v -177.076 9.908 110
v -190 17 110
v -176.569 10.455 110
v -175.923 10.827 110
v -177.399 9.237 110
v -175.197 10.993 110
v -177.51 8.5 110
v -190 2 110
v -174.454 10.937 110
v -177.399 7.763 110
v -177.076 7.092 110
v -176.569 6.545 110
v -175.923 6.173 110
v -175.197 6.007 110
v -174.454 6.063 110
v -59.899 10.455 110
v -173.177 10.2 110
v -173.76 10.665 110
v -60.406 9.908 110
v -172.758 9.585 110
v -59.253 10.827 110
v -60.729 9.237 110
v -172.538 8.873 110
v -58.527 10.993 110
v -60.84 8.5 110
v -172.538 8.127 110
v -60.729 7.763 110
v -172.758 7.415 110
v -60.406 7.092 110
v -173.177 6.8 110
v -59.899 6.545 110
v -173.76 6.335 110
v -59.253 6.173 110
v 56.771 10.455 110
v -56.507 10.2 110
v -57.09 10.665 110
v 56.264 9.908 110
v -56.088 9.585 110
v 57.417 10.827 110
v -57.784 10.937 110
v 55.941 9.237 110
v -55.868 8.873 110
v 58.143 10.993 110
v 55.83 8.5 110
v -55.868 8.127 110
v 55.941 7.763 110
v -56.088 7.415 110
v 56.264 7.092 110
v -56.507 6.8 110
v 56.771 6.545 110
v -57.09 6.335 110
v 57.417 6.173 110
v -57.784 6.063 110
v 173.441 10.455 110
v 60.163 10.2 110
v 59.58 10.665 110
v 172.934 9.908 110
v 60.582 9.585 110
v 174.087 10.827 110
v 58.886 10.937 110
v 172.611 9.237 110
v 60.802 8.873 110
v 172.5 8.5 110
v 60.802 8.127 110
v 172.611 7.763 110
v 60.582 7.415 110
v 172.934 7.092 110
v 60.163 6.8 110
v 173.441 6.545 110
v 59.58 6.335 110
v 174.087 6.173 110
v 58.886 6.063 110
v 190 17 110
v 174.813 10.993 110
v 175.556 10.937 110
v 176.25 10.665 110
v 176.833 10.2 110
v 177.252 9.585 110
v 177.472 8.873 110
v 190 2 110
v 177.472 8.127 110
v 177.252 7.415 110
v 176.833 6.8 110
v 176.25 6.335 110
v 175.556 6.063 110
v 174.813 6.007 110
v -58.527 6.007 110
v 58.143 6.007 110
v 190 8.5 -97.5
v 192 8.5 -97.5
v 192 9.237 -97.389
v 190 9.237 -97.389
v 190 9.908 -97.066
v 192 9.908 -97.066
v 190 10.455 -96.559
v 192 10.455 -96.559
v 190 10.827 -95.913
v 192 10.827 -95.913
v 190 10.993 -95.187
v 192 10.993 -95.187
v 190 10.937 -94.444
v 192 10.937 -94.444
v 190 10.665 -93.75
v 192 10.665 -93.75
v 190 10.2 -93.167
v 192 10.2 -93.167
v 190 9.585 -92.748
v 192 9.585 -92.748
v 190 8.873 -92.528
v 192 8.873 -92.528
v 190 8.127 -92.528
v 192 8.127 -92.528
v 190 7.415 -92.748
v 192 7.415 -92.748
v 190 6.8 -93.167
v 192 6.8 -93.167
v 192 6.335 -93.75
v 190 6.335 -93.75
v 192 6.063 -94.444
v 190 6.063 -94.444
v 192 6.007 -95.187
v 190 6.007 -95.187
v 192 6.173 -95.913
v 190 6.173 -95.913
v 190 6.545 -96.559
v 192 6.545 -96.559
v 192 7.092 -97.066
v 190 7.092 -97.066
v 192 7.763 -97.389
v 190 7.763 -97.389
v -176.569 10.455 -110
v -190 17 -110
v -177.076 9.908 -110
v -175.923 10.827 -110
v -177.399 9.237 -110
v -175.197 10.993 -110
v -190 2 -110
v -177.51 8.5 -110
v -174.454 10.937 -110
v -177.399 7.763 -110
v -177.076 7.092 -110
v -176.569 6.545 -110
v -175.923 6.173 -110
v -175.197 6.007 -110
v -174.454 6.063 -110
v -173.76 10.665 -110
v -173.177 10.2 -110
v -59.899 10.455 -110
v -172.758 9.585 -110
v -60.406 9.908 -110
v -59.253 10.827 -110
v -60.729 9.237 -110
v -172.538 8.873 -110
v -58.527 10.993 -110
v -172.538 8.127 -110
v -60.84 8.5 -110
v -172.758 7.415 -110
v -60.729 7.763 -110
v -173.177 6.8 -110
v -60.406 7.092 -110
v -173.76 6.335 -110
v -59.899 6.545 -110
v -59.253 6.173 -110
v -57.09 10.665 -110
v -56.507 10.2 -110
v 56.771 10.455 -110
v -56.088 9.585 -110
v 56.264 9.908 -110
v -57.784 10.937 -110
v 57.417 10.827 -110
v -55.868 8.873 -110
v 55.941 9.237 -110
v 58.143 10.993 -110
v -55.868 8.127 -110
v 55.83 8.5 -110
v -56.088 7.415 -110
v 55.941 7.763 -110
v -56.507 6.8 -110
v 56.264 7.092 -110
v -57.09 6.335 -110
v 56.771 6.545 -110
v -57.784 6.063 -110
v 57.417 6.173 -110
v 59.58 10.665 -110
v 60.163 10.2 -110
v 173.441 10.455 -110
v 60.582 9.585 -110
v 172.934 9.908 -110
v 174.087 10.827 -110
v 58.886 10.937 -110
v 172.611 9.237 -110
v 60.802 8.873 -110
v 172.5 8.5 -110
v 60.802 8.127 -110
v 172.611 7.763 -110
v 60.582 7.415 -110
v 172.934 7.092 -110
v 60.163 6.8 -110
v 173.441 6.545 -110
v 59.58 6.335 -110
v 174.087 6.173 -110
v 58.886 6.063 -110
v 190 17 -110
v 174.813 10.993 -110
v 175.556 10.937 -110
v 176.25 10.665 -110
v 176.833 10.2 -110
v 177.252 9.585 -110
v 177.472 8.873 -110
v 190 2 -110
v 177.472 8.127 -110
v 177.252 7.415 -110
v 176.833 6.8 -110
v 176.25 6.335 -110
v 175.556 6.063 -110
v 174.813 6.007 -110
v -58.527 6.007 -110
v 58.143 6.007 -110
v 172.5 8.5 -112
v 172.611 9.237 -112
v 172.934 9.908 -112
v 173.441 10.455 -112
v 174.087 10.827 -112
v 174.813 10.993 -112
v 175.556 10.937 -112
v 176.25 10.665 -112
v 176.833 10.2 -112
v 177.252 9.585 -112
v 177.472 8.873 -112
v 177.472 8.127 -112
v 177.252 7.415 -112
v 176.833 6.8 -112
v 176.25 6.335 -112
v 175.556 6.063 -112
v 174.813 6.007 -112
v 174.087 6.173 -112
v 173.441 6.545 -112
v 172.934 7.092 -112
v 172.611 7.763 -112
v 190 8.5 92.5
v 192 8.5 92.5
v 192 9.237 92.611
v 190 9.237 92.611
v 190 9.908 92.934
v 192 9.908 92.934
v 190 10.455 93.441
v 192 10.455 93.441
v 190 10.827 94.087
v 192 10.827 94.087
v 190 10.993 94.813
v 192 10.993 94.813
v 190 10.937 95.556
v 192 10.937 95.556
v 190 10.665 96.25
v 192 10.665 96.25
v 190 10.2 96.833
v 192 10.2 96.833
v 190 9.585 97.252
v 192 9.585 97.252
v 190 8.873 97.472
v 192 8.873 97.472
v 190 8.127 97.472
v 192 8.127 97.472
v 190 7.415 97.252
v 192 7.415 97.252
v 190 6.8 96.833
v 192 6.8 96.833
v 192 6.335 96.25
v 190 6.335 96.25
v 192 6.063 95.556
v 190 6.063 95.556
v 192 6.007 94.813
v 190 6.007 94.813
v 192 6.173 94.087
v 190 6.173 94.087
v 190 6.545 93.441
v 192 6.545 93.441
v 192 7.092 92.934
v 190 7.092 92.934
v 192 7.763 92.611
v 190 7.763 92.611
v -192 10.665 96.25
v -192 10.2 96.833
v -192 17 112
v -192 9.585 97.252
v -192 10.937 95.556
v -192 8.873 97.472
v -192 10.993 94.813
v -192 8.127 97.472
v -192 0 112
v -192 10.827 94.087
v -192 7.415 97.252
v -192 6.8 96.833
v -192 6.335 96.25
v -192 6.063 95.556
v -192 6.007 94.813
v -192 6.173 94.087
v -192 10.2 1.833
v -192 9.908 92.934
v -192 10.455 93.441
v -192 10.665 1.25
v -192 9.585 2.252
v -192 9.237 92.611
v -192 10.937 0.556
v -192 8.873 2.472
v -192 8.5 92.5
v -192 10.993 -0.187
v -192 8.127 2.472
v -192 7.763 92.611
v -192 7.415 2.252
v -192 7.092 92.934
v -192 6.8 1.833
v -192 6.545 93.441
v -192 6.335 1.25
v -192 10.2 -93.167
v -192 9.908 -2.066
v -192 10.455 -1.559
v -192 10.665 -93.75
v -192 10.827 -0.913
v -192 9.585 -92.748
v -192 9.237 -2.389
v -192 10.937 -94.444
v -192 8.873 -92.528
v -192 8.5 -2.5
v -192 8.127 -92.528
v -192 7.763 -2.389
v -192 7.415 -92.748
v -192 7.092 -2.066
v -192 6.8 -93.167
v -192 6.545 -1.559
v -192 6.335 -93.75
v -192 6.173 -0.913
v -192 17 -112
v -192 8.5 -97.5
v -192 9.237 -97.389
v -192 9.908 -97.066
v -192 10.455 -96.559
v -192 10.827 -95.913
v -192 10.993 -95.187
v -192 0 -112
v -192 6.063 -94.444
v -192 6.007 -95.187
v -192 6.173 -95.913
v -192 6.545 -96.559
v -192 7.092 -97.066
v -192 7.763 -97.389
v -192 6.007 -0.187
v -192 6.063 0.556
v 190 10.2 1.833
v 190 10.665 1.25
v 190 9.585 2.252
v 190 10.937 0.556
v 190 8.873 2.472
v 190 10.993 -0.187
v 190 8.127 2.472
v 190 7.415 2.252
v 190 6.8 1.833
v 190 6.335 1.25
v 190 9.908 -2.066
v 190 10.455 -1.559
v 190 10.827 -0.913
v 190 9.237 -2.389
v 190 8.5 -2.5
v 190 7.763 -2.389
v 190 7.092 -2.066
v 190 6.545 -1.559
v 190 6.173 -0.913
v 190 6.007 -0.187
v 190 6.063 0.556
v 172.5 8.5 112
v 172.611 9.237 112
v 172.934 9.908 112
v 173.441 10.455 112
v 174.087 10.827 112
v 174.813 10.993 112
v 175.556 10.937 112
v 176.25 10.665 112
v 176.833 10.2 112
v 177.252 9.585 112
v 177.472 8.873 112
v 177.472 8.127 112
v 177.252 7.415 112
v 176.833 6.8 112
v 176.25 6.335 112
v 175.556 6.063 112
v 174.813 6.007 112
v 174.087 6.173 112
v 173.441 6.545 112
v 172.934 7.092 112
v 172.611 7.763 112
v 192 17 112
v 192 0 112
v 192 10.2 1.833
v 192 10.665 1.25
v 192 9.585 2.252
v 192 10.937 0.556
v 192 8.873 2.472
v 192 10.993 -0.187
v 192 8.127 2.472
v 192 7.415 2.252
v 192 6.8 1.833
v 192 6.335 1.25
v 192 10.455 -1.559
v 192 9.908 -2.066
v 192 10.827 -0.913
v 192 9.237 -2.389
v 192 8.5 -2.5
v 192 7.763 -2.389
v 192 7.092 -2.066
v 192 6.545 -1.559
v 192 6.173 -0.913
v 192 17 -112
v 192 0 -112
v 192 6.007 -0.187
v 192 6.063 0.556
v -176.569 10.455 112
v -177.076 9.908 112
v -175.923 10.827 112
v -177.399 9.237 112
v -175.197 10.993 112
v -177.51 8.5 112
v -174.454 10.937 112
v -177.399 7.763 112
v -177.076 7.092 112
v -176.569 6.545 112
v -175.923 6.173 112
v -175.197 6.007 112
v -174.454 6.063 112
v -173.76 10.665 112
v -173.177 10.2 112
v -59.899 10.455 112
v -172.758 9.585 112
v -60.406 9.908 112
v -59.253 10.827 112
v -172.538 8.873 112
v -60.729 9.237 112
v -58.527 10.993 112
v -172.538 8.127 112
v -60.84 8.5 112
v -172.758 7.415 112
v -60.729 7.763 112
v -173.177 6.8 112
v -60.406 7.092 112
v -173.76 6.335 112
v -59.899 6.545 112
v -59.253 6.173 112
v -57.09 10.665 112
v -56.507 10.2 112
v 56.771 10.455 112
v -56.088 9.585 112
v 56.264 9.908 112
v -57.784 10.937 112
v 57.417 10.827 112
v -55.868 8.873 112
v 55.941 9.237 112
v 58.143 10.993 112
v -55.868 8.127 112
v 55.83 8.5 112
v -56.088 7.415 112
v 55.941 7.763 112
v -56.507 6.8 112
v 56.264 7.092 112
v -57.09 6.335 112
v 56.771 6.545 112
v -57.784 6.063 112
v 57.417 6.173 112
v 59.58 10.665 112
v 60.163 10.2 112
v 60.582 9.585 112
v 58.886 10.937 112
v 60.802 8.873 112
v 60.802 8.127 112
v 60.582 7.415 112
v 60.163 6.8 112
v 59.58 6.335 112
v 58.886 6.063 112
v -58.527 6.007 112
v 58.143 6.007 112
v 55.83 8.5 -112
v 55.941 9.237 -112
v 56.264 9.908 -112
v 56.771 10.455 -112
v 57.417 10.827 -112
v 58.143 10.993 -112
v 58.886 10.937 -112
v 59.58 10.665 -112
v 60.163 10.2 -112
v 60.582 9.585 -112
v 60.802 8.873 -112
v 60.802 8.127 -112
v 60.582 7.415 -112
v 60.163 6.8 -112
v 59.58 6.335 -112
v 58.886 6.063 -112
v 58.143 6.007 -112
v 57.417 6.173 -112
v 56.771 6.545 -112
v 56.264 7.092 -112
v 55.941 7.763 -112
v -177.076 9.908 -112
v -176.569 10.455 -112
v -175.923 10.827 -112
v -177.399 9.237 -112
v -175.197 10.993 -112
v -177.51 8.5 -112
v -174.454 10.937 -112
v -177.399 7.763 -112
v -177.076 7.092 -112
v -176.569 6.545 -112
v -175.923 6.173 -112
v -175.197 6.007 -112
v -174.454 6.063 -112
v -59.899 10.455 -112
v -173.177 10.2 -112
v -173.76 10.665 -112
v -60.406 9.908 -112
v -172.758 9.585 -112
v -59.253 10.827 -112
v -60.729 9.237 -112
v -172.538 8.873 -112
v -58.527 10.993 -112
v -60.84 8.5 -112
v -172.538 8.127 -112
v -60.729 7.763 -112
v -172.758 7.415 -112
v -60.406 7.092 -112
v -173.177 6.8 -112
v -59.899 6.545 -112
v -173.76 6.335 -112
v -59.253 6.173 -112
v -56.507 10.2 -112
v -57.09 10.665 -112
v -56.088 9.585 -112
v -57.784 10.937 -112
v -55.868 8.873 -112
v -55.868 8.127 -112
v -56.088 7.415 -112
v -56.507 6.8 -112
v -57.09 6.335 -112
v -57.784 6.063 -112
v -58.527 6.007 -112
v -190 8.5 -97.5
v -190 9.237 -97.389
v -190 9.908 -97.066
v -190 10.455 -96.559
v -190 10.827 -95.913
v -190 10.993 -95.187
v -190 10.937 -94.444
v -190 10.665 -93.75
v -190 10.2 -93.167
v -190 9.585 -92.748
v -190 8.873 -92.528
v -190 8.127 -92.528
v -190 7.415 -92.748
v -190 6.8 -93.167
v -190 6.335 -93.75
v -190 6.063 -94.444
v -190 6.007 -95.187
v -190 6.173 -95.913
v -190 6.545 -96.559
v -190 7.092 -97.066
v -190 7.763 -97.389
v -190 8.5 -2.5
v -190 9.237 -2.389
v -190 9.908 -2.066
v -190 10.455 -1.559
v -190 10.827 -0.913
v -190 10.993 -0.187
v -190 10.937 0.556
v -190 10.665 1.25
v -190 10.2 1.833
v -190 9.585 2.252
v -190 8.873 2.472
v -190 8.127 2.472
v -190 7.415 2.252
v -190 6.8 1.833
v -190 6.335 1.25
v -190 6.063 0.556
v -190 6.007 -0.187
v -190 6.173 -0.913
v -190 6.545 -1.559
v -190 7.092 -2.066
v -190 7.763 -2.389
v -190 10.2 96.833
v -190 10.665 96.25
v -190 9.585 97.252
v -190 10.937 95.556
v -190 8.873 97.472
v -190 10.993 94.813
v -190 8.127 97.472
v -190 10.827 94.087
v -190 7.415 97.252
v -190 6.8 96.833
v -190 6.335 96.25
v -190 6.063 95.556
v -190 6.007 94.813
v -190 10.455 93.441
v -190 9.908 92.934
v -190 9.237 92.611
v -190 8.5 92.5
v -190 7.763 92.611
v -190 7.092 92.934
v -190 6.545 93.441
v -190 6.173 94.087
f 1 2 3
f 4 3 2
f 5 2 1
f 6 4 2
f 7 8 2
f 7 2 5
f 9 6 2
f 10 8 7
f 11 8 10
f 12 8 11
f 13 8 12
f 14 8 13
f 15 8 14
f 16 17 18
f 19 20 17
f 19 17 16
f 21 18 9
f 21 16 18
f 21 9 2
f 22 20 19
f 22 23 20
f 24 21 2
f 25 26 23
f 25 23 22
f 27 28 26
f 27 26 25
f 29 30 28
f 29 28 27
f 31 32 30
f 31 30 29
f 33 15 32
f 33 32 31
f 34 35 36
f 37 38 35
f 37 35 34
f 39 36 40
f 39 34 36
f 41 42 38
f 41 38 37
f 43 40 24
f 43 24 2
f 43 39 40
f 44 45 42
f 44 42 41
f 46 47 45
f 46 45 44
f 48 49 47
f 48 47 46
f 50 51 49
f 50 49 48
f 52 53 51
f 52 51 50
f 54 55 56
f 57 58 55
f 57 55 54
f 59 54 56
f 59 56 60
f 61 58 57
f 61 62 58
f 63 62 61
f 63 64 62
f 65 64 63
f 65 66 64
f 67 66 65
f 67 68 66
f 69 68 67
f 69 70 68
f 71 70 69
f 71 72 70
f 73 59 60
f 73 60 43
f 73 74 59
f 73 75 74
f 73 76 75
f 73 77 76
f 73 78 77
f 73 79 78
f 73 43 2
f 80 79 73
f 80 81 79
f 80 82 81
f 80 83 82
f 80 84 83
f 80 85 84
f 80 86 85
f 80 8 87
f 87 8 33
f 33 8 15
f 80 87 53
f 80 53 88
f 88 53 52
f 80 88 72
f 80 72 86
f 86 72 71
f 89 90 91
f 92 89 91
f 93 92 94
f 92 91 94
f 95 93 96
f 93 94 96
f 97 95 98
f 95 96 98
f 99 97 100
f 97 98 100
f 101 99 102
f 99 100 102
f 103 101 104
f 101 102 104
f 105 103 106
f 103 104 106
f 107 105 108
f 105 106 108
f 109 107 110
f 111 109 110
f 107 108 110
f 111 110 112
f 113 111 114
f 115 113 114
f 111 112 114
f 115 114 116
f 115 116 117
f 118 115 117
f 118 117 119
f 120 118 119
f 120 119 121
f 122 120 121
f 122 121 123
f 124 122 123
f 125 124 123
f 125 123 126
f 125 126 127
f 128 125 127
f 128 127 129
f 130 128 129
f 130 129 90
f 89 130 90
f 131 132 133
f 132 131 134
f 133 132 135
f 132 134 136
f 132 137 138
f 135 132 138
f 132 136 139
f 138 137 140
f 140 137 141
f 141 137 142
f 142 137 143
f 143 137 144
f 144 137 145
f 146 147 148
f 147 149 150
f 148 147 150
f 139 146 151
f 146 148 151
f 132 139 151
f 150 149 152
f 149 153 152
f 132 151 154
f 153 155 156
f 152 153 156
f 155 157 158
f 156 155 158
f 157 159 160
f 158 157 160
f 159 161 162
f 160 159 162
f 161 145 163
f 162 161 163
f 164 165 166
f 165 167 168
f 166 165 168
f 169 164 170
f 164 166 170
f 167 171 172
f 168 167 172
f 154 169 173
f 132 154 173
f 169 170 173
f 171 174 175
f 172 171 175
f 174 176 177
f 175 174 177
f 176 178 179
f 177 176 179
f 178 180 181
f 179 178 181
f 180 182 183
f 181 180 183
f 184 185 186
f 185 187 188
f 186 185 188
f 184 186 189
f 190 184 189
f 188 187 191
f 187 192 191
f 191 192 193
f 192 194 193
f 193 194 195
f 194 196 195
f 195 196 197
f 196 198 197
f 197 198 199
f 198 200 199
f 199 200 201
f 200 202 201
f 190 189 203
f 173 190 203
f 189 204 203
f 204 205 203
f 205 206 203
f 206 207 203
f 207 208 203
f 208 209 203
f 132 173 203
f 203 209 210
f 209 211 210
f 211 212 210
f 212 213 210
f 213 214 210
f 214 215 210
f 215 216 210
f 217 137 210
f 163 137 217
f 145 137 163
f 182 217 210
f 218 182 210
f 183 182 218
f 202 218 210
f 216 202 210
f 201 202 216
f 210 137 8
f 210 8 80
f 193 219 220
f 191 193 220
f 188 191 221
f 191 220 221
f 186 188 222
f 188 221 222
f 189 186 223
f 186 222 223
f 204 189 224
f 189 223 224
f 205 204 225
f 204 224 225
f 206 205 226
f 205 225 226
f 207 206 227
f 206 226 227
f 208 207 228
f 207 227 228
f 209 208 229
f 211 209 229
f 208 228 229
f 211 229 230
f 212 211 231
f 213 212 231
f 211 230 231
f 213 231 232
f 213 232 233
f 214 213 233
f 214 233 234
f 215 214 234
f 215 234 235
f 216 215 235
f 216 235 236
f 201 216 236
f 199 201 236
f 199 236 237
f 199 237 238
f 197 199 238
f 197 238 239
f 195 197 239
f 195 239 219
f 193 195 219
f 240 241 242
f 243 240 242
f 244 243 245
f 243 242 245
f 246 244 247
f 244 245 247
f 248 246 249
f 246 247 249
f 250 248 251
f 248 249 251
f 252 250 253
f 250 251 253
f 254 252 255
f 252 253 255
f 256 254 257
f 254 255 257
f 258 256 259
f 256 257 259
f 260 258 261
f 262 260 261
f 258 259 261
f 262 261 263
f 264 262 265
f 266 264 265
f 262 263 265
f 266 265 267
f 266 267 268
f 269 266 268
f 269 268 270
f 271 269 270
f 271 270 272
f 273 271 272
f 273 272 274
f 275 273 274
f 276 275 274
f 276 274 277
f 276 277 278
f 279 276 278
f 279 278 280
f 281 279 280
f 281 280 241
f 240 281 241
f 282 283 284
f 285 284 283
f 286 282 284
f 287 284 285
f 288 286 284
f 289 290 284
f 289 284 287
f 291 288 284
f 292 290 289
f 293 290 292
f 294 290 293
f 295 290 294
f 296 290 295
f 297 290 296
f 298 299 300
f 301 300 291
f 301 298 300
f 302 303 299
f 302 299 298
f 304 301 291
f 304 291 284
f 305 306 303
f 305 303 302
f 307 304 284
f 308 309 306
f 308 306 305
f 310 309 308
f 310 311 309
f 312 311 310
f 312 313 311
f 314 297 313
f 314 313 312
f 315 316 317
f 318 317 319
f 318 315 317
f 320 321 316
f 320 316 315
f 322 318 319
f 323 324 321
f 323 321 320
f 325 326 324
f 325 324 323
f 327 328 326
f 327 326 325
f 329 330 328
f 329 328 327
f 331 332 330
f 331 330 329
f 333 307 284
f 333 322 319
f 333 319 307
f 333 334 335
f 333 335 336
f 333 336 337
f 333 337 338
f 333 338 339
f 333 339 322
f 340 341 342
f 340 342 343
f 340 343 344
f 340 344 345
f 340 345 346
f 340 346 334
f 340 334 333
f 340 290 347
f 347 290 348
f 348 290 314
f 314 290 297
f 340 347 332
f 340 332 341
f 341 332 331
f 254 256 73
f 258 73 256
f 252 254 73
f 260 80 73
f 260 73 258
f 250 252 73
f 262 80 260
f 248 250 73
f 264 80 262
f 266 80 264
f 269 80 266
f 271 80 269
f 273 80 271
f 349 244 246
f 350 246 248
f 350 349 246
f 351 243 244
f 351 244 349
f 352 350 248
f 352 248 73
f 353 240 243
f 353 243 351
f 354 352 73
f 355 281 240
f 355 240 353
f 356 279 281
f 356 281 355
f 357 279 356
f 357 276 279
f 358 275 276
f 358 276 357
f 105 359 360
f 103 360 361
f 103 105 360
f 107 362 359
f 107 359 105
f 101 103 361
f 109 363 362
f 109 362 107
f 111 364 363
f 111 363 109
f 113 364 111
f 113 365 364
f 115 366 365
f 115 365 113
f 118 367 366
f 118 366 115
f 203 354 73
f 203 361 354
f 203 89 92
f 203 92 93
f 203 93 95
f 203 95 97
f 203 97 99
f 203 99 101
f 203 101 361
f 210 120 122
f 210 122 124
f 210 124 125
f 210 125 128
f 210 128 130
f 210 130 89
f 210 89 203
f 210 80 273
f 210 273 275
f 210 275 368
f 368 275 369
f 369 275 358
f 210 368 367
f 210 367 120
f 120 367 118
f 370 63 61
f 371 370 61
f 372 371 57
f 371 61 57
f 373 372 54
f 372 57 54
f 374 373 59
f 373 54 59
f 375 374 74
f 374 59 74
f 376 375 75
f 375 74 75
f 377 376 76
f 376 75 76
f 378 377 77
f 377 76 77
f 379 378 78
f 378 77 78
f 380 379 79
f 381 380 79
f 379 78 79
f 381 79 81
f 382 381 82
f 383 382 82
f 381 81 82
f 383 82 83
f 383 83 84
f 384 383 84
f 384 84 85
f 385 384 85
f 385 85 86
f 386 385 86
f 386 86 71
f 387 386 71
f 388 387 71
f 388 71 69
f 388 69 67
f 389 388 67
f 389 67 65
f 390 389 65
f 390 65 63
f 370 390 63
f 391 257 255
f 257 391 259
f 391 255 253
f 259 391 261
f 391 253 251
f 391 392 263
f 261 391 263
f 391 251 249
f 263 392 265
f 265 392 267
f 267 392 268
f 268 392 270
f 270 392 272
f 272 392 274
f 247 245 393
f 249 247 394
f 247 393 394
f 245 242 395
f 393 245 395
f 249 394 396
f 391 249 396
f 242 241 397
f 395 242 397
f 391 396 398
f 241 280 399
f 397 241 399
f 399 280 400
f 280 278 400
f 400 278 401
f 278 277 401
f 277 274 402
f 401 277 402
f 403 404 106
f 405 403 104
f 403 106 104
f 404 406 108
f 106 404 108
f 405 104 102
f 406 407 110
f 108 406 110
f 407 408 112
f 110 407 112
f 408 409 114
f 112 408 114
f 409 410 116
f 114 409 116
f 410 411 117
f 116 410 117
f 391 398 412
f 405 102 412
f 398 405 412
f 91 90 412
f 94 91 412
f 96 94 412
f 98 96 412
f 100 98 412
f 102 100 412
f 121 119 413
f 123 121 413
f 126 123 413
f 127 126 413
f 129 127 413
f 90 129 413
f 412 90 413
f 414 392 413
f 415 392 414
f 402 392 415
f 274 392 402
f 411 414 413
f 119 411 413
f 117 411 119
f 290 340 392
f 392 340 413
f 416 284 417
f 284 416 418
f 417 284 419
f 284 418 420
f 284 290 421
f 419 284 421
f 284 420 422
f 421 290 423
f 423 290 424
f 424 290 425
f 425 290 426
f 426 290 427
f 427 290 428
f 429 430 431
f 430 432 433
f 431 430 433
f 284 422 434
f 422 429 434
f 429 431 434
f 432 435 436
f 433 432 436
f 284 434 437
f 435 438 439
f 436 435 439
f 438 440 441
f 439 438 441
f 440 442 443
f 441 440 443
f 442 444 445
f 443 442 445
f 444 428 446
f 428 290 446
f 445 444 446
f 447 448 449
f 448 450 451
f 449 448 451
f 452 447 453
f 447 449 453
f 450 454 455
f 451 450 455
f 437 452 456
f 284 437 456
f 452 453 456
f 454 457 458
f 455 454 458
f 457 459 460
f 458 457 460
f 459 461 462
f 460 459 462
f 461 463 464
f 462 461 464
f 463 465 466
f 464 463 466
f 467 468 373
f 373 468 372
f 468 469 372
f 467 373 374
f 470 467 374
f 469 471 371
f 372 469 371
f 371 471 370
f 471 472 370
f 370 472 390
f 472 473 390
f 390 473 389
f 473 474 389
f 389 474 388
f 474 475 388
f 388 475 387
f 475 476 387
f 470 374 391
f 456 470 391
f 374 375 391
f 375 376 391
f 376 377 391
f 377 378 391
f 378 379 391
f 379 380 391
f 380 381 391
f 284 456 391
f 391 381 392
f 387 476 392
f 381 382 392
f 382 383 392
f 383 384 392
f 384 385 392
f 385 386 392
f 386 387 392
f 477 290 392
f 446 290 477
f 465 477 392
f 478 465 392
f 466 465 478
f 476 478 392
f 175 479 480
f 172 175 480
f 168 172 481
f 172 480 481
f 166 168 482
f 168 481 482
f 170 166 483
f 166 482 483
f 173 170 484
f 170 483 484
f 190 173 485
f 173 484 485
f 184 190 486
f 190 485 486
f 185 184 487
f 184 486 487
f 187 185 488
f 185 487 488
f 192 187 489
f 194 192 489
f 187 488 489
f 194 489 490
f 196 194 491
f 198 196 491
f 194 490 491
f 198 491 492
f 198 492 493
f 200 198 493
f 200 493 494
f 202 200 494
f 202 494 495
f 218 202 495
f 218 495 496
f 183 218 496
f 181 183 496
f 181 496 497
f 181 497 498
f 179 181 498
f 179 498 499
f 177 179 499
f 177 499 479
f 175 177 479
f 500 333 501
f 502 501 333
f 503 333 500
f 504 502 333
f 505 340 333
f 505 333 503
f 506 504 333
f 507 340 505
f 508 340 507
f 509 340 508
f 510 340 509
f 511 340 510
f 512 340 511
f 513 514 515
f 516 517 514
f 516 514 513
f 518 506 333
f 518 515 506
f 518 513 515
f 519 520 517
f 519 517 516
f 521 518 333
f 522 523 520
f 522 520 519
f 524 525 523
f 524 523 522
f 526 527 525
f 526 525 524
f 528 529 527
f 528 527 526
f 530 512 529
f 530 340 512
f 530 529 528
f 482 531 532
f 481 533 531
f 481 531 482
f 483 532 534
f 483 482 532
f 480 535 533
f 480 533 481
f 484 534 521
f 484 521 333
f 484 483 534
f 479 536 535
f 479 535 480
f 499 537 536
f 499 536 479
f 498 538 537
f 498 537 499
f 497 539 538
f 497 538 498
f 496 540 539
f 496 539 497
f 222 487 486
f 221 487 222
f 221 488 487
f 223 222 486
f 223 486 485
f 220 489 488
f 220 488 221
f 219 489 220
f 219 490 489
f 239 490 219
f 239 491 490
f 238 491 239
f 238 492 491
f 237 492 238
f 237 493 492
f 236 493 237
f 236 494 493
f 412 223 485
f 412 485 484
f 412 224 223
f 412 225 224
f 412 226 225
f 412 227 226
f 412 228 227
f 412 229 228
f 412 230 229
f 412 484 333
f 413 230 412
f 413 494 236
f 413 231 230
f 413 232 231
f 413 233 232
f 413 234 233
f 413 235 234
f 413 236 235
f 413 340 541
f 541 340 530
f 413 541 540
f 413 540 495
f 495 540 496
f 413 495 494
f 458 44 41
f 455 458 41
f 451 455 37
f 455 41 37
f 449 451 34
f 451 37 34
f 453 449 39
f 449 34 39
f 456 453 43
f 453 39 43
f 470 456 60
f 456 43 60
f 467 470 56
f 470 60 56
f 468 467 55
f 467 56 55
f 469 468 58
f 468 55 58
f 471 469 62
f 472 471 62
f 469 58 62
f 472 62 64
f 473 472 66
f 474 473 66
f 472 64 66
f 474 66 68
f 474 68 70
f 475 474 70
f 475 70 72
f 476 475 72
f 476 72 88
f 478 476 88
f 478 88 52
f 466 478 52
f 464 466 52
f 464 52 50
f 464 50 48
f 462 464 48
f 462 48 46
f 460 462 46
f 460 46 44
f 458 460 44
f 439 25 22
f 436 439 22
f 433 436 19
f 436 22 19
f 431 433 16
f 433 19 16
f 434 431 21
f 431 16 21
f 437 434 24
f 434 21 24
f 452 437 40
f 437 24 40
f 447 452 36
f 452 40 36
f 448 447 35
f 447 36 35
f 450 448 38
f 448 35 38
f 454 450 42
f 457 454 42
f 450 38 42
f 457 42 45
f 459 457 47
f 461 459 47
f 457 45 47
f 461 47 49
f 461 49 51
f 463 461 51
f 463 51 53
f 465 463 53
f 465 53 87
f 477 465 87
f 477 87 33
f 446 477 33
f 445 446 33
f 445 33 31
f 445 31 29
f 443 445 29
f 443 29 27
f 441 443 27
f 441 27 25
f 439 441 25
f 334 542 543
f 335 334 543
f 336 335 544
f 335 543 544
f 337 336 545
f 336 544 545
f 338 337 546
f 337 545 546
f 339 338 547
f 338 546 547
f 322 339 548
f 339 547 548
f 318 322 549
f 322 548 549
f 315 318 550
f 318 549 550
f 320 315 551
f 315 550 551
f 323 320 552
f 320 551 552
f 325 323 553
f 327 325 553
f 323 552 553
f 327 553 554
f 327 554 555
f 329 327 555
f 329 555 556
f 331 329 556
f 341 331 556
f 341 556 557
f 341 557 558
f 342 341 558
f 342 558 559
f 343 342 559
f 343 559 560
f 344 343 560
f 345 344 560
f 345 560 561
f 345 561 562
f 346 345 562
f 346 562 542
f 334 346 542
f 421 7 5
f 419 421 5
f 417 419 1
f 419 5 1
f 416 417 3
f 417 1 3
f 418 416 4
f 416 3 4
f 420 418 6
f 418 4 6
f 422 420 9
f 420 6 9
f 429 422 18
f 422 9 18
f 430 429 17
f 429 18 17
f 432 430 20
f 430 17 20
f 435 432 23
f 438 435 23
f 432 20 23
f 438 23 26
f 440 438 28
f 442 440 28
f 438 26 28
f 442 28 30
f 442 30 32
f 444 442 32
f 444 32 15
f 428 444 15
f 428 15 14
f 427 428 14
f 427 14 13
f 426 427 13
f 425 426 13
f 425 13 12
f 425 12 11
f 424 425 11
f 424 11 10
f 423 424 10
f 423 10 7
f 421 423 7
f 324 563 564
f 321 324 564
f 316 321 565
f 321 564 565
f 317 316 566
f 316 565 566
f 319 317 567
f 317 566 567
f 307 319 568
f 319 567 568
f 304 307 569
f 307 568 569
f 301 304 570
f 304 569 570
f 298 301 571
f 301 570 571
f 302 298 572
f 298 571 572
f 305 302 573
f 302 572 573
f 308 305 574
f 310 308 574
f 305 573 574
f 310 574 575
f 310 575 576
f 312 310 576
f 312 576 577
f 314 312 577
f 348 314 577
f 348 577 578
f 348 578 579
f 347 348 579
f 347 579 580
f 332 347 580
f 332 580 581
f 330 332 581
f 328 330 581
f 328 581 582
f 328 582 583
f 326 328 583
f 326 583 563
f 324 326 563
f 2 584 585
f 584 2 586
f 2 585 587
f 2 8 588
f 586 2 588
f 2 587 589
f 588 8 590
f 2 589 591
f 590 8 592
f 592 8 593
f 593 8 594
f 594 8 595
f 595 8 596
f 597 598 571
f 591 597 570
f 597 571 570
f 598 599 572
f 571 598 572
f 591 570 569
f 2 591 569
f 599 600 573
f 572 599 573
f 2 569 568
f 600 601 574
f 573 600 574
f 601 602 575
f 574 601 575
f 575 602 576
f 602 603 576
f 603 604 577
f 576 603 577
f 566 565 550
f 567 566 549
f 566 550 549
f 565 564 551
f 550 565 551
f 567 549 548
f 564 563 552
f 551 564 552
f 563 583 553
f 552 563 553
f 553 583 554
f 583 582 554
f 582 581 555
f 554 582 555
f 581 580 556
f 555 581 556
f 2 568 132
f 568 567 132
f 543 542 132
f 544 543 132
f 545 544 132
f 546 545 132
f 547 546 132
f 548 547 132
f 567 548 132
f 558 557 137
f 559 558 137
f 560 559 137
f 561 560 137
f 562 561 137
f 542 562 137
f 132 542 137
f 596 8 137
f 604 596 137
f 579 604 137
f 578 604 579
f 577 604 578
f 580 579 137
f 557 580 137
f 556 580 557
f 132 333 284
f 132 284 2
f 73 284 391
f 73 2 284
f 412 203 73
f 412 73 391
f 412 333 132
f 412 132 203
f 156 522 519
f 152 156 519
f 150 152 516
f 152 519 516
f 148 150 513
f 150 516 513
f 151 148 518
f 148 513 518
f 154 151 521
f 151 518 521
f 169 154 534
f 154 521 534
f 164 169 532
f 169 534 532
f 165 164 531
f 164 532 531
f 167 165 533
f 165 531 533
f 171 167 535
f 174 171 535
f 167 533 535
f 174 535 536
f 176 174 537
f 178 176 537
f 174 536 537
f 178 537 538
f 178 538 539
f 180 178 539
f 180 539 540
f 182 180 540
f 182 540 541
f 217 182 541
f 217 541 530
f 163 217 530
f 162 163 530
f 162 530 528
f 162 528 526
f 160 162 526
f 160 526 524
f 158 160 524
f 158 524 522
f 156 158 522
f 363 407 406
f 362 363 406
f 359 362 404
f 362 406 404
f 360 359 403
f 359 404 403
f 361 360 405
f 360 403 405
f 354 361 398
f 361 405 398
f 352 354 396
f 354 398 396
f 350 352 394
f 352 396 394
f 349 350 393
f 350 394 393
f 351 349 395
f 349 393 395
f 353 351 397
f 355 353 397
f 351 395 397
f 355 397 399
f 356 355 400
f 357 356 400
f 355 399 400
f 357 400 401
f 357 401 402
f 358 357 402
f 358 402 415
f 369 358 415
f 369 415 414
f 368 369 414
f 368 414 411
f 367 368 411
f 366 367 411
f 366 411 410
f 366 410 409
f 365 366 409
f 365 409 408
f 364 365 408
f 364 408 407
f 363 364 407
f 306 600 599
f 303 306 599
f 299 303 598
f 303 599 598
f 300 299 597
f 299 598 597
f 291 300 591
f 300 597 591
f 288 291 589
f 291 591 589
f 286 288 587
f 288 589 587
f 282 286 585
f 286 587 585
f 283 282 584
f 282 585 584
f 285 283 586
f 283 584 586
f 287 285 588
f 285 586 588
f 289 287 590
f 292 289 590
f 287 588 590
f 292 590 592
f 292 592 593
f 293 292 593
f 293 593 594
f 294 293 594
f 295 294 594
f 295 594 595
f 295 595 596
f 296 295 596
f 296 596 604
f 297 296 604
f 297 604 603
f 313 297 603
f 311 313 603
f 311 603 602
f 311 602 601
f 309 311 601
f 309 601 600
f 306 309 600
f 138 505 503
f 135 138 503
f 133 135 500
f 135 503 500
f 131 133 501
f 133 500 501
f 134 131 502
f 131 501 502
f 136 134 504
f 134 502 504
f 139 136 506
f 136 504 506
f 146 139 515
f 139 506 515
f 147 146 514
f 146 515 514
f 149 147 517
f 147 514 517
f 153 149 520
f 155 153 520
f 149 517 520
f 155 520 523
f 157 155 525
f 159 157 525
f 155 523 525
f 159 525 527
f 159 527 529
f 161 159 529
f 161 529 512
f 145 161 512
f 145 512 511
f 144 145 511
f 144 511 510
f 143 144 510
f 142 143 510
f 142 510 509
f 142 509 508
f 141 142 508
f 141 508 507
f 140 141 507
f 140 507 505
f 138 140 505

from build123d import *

# Parameters (mm, degrees)
SKETCH_1_W          = 384
SKETCH_1_H          = 224
EXTRUDE_1_DEPTH     = 2
SKETCH_2_W          = 384
SKETCH_2_H          = 224
SKETCH_2_W_2        = 380
SKETCH_2_H_2        = 220
EXTRUDE_2_DEPTH     = 15
SKETCH_3_R          = 2.5
CUT_EXTRUDE_1_DEPTH = 296.514805044
SKETCH_4_R          = 2.5
CUT_EXTRUDE_2_DEPTH = 401.36108702


with BuildPart() as part:
    # 草图1 → 凸台-拉伸1 (new body)
    with BuildSketch(Plane(origin=(0, 0, 0), x_dir=(1, 0, 0), z_dir=(0, 1, 0))):
        Rectangle(SKETCH_1_W, SKETCH_1_H)
    extrude(amount=EXTRUDE_1_DEPTH)

    # 草图2 → 凸台-拉伸2 (add)
    with BuildSketch(Plane(origin=(0, 2, 0), x_dir=(1, 0, 0), z_dir=(0, 1, 0))):
        Rectangle(SKETCH_2_W, SKETCH_2_H)
        Rectangle(SKETCH_2_W_2, SKETCH_2_H_2, mode=Mode.SUBTRACT)
    extrude(amount=EXTRUDE_2_DEPTH)

    # 草图3 → 切除-拉伸1 (cut, through all)
    with BuildSketch(Plane(origin=(0, 0, -112), x_dir=(-1, 0, 0), z_dir=(0, 0, -1))):
        with Locations((-175, 8.5)):
            Circle(SKETCH_3_R)
        with Locations((-58.33, 8.5)):
            Circle(SKETCH_3_R)
        with Locations((58.34, 8.5)):
            Circle(SKETCH_3_R)
        with Locations((175.01, 8.5)):
            Circle(SKETCH_3_R)
    extrude(amount=-CUT_EXTRUDE_1_DEPTH, mode=Mode.SUBTRACT)

    # 草图4 → 切除-拉伸2 (cut, through all)
    with BuildSketch(Plane(origin=(192, 0, 0), x_dir=(0, 0, -1), z_dir=(1, 0, 0))):
        with Locations((-95, 8.5)):
            Circle(SKETCH_4_R)
        with Locations((0, 8.5)):
            Circle(SKETCH_4_R)
        with Locations((95, 8.5)):
            Circle(SKETCH_4_R)
    extrude(amount=-CUT_EXTRUDE_2_DEPTH, mode=Mode.SUBTRACT)


solid = part.part
